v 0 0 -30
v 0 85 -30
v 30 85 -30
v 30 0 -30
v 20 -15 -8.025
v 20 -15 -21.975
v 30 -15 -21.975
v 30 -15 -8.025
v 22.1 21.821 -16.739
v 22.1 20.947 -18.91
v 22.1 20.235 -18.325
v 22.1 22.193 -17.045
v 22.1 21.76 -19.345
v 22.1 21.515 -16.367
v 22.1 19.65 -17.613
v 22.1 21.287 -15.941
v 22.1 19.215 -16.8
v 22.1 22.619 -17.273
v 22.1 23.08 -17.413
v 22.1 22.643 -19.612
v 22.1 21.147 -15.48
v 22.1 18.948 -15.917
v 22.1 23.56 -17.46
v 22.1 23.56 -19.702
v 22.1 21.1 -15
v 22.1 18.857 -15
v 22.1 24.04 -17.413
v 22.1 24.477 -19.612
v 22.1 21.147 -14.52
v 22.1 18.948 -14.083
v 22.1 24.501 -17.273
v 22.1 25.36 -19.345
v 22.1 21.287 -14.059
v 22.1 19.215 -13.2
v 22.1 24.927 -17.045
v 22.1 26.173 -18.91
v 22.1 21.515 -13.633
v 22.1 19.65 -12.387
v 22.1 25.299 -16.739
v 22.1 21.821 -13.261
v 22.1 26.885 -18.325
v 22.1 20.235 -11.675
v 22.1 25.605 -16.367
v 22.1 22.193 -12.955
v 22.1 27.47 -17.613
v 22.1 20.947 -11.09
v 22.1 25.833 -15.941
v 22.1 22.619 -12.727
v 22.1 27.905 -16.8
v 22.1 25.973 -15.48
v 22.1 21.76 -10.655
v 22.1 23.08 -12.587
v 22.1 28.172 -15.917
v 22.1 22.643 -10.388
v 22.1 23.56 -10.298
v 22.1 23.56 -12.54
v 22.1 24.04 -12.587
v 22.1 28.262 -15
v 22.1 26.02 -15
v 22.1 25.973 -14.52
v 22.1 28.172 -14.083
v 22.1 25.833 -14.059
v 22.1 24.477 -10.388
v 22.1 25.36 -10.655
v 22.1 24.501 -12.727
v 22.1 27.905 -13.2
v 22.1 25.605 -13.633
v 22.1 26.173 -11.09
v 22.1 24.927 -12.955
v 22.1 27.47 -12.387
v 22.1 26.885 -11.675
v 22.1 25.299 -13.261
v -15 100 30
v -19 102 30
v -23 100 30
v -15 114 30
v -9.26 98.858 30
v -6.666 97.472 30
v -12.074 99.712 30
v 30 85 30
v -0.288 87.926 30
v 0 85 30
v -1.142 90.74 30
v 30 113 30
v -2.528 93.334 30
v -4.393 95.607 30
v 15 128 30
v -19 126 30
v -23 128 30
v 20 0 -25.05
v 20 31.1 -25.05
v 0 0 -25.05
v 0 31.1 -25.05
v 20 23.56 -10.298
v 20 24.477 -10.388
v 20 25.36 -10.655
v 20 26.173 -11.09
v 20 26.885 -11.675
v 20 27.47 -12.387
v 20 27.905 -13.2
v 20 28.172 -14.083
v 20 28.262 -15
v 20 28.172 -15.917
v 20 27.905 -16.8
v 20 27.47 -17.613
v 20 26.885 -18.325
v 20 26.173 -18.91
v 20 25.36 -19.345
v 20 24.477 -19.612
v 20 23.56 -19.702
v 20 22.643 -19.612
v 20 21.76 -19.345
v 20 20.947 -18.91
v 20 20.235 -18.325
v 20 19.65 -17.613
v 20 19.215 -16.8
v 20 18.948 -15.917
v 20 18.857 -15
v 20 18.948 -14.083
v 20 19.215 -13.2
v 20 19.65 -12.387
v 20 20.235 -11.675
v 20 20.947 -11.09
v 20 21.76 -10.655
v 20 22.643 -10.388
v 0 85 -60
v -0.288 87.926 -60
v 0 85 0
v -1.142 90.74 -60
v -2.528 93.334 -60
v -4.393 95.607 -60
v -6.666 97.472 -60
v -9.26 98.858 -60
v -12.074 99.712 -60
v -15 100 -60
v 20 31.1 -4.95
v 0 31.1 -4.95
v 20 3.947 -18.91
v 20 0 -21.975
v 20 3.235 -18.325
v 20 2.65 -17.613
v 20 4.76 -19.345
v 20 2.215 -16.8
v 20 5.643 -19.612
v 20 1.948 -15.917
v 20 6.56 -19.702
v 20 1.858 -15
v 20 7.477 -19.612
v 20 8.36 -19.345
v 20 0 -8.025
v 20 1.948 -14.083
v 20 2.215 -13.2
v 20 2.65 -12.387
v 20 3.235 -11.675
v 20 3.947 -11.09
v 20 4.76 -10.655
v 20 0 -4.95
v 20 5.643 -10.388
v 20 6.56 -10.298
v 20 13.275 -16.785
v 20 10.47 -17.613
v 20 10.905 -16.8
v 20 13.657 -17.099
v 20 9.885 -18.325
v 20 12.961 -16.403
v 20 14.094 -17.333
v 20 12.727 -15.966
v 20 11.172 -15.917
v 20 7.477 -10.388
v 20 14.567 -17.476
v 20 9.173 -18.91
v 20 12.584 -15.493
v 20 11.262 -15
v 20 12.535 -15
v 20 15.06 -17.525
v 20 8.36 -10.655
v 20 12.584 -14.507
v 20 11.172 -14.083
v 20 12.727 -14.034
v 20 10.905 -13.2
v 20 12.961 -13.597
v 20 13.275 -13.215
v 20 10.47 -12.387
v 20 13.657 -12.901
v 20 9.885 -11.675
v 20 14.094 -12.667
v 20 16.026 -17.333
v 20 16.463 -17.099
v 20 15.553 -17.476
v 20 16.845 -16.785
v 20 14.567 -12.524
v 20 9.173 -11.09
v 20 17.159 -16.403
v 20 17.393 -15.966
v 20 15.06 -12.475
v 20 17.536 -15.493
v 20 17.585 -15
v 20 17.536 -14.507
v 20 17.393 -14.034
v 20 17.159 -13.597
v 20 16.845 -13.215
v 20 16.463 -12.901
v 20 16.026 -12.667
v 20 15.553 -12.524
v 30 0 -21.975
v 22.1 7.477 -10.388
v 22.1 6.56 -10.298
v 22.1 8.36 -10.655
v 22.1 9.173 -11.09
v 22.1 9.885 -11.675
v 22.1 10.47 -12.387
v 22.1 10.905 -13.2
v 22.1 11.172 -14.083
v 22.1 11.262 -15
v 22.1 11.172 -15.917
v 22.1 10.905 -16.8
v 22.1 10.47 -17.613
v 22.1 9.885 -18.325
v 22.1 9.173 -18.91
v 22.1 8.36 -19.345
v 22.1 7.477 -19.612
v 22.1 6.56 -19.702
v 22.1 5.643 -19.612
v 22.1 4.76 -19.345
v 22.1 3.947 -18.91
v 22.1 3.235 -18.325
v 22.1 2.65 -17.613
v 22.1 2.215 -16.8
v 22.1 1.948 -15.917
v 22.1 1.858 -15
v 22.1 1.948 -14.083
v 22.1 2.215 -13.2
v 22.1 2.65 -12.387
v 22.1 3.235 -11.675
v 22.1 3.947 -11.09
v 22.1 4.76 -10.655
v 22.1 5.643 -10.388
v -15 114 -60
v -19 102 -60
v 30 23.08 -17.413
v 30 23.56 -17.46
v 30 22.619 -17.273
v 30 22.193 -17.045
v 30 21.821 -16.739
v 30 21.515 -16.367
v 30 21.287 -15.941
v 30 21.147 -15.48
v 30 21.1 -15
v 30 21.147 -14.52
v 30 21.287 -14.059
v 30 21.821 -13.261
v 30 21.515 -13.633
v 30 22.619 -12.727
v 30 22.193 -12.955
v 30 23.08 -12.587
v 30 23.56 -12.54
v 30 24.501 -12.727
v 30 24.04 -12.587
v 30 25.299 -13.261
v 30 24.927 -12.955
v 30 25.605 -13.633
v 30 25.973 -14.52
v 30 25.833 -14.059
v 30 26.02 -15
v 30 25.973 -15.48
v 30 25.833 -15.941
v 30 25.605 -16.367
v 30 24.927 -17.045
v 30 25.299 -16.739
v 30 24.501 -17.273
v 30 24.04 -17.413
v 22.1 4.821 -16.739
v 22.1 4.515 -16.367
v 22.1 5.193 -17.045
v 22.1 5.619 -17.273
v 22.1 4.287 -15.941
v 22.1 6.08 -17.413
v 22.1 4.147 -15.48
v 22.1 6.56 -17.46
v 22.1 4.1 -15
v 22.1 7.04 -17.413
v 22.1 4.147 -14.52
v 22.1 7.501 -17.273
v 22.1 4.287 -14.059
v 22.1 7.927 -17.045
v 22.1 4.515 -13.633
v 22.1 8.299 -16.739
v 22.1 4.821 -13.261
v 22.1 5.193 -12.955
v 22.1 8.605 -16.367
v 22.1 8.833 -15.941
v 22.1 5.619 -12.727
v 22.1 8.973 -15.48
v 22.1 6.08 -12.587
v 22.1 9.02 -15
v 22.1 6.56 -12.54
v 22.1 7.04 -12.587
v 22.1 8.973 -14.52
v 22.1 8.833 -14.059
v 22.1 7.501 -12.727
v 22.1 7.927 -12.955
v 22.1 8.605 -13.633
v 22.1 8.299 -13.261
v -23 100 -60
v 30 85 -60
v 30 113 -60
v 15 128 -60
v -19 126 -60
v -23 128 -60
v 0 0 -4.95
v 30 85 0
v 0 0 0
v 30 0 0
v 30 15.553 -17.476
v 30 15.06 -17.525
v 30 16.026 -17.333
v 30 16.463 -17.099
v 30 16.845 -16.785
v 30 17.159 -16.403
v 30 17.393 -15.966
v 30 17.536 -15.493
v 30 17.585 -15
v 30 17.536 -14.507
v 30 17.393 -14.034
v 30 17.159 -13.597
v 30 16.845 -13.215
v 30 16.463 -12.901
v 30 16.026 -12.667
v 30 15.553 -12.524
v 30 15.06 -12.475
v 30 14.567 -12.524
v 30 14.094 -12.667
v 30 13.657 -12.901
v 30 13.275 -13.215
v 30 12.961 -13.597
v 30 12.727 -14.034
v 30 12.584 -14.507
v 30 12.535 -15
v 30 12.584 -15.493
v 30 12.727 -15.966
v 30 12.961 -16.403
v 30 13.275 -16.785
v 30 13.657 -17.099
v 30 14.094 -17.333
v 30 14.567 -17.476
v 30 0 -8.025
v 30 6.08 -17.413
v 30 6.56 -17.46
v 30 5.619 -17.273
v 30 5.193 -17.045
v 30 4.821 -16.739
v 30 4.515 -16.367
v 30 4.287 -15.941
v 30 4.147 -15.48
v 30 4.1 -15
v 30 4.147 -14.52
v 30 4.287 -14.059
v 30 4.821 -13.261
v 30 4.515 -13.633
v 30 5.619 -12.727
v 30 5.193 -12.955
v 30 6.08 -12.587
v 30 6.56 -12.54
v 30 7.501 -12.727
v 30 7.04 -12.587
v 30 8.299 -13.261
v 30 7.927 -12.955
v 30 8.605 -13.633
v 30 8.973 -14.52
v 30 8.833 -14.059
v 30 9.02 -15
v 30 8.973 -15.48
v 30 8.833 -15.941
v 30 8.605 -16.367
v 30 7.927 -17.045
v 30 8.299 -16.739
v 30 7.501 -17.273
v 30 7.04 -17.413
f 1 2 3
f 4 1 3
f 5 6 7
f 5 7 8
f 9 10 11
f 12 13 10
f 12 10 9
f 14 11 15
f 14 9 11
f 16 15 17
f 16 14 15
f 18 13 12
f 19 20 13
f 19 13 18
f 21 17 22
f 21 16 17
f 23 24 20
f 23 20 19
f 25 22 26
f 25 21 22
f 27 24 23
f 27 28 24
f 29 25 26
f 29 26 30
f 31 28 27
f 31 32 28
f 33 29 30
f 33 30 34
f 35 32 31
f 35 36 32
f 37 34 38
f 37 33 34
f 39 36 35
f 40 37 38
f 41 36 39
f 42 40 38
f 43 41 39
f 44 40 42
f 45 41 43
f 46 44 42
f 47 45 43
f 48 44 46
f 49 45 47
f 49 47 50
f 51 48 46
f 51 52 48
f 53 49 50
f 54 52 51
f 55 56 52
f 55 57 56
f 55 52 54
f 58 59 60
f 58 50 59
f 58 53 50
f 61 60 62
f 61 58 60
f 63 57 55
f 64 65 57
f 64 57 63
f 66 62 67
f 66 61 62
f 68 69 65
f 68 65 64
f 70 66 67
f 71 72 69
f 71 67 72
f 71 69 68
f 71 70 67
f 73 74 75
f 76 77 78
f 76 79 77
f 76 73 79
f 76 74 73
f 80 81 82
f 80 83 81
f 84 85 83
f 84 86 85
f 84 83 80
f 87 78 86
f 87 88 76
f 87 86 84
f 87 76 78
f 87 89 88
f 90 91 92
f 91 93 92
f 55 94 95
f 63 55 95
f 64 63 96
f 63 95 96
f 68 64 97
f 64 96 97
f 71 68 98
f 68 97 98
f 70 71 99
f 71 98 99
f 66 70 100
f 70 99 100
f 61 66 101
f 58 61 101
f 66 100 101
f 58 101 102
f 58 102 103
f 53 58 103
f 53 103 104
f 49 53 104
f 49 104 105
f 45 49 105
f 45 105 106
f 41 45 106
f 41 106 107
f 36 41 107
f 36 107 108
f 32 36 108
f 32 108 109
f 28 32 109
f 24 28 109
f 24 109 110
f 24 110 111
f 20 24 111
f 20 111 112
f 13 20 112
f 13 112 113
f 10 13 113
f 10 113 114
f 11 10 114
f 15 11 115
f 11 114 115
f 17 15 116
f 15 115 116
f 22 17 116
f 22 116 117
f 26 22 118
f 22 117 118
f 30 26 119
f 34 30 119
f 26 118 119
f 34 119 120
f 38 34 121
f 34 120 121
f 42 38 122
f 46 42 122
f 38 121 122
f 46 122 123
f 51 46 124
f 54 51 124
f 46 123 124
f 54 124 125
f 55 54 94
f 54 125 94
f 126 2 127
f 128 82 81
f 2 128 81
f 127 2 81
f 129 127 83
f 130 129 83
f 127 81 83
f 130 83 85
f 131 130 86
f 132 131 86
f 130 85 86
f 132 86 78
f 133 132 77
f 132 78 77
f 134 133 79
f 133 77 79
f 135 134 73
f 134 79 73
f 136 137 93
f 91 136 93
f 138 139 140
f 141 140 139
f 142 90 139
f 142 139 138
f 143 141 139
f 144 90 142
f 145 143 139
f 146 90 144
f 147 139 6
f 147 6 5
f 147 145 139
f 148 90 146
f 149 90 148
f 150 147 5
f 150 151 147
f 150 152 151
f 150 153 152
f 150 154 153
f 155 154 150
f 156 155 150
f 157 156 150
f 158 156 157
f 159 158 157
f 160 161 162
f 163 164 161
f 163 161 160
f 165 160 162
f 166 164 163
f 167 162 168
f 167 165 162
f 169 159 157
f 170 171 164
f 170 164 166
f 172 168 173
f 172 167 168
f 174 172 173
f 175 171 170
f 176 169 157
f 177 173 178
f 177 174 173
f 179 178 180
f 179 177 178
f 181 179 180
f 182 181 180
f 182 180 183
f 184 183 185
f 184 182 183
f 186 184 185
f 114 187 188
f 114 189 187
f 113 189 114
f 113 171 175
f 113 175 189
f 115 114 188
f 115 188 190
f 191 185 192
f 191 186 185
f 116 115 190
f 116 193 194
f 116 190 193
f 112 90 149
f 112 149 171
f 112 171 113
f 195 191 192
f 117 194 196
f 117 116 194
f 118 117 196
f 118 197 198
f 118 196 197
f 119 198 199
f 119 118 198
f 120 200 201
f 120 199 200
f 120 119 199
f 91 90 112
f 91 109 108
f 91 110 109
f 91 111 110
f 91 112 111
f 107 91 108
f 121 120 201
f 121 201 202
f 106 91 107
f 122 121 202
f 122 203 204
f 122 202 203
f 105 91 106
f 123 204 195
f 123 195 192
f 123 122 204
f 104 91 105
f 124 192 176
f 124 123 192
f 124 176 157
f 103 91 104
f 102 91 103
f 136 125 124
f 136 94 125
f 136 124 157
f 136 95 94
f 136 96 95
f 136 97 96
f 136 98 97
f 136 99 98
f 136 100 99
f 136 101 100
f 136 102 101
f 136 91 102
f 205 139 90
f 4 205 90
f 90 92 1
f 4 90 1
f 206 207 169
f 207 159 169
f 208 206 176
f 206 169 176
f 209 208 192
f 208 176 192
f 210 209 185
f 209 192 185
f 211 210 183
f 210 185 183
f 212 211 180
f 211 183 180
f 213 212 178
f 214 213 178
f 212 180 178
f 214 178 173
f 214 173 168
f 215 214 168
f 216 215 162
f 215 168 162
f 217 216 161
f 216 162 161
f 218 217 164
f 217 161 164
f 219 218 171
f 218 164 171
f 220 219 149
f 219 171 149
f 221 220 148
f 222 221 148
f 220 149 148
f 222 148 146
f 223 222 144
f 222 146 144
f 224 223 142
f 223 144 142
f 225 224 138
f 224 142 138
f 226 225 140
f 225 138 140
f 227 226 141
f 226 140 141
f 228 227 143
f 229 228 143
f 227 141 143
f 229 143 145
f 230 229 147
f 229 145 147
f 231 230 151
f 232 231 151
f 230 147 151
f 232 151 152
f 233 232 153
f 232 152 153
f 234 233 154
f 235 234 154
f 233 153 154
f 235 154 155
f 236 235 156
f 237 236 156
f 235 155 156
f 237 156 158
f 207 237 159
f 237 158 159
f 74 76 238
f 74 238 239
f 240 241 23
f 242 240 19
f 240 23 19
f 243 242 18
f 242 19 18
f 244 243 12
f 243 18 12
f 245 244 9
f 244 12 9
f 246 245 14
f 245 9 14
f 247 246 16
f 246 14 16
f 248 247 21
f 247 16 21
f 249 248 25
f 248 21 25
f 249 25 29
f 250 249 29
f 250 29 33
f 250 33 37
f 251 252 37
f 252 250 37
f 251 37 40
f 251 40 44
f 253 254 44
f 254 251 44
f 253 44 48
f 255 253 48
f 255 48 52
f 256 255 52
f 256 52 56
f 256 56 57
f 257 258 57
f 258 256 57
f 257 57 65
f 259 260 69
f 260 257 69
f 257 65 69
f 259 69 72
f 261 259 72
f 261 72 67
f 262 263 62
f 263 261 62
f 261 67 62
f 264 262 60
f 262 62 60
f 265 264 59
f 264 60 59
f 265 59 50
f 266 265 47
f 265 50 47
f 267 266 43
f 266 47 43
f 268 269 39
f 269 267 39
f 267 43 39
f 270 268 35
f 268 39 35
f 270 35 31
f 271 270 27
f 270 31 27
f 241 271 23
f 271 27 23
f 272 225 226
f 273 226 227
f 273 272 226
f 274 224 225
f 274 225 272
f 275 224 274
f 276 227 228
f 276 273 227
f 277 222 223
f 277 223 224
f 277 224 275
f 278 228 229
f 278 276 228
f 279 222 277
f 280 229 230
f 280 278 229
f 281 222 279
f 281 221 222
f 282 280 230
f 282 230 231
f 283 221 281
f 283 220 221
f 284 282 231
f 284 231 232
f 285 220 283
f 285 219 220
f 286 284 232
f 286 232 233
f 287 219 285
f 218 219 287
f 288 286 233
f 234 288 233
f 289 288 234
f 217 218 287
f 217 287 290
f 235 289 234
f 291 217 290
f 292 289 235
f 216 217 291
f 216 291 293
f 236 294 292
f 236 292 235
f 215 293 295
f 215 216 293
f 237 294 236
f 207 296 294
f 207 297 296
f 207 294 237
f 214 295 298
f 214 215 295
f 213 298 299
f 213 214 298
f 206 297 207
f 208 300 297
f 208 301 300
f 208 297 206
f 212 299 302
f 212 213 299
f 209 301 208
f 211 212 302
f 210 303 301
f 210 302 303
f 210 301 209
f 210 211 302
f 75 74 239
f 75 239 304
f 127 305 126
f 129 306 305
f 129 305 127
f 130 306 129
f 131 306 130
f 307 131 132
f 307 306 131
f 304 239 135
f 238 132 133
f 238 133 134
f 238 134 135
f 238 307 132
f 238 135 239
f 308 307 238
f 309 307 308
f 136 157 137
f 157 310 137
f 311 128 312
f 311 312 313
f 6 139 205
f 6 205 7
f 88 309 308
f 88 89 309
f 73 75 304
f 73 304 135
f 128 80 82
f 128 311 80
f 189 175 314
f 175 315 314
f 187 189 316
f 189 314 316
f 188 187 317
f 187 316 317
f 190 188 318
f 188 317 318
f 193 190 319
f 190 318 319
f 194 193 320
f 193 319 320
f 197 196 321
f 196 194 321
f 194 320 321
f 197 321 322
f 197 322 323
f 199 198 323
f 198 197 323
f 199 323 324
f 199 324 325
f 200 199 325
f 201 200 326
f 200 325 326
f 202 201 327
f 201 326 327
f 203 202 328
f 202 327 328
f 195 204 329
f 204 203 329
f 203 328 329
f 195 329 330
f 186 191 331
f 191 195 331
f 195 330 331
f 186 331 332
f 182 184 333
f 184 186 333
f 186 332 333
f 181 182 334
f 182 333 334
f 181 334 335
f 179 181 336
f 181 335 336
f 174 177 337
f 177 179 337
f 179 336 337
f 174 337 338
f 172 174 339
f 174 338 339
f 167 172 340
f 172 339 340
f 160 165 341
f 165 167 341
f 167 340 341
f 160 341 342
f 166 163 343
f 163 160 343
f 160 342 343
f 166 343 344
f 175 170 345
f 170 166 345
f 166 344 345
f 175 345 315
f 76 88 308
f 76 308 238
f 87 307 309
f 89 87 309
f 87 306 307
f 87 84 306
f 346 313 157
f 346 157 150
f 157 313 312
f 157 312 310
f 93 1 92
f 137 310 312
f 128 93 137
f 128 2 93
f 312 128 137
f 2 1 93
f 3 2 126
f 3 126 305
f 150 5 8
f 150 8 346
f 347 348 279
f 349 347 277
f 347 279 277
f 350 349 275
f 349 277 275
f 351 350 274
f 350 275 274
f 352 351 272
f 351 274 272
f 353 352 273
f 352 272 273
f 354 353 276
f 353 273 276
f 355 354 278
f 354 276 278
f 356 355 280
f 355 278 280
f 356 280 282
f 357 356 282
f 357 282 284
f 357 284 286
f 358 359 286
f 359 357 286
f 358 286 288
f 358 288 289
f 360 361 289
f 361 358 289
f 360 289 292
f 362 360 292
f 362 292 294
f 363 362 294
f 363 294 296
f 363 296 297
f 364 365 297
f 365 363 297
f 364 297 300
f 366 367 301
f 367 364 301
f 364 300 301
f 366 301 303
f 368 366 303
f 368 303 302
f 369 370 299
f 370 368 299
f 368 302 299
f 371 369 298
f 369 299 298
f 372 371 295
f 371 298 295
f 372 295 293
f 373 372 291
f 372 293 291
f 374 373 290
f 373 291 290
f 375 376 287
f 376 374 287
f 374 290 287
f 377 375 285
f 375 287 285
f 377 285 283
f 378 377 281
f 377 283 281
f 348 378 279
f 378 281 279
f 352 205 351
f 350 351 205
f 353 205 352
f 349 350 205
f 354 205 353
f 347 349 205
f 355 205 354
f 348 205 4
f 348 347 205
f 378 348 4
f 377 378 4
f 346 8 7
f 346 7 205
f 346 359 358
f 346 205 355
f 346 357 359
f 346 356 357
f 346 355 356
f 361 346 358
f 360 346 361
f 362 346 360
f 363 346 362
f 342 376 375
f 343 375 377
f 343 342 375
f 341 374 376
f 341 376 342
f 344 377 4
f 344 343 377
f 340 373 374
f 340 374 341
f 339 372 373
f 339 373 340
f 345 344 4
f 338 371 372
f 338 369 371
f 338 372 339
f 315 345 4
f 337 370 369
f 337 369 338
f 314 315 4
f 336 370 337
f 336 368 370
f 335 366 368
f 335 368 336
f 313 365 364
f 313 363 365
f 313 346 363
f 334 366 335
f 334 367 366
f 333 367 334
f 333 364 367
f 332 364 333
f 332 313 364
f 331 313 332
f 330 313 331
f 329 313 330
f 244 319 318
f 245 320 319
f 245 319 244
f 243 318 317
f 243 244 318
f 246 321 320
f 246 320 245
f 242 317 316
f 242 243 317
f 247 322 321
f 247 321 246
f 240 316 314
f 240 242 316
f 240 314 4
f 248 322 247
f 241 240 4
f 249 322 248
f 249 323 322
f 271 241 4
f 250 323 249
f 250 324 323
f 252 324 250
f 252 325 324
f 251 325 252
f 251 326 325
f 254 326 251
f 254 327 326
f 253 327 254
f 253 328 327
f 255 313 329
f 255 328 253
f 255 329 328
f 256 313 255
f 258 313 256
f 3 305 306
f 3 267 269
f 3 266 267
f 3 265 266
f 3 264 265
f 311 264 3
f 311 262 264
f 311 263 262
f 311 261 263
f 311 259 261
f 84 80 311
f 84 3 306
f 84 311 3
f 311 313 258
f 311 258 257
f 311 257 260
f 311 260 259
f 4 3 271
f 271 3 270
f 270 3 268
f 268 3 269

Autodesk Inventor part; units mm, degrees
ref_plane "YZ Plane" through (0, 0, 0) normal (1, 0, 0) x (0, 1, 0)
ref_plane "XZ Plane" through (0, 0, 0) normal (0, 1, 0) x (-1, 0, 0)
sketch "Sketch1" plane through (0, 0, 0) normal (0, 0, 1) x (1, 0, 0)
  line L0 (0, 0) -> (25, 0)
  line L1 (25, 0) -> (25, 40)
  line L2 (25, 40) -> (0, 40)
  line L3 (0, 40) -> (0, 0)
  dimension "d1" = 25
  dimension "d2" = 40
  dimension "d3" = 25
extrude "Extrusion1" add sketch "Sketch1" against normal blind 30
sketch "Sketch2" plane through (25, 0, 0) normal (1, 0, 0) x (0, 0, -1)
  line L0 (0, 0) -> (30, 0) projected
  circle A0 centre (15, 6.56) radius 2.46
extrude "Extrusion2" cut sketch "Sketch2" against normal blind 30
sketch "Sketch3" plane through (0, 0, 0) normal (-1, 0, 0) x (0, 0, 1)
  line L0 (0, 0) -> (-30, 0) projected
  line L1 (-25.05, 0) -> (-4.95, 0)
  line L2 (-4.95, 0) -> (-4.95, 33.12)
  line L3 (-4.95, 33.12) -> (-25.05, 33.12)
  line L4 (-25.05, 33.12) -> (-25.05, 0)
  dimension "d11" = 20.1
extrude "Extrusion3" cut sketch "Sketch3" against normal blind 20
sketch "Sketch4" plane through (0, 0, 0) normal (0, -1, 0) x (1, 0, 0)
  line L0 (20, -4.95) -> (20, -25.05) projected
  line L1 (20, -15) -> (25, -15)
  line L2 (25, 0) -> (25, -30) projected
  line L3 (20, -8.025) -> (25, -8.025)
  line L4 (25, -8.025) -> (25, -21.975)
  line L5 (25, -21.975) -> (20, -21.975)
  line L6 (20, -21.975) -> (20, -8.025)
  line L7 (20, -8.025) -> (25, -21.975) construction
  line L8 (25, -8.025) -> (20, -21.975) construction
  line L9 (25, -12.54) -> (25, -17.46) projected
  point P0 (0, 0)
  point P1 (22.5, -15)
  dimension "d14" = 13.95
extrude "Extrusion4" add sketch "Sketch4" along normal blind 15
sketch "Sketch5" plane through (20, 0, 0) normal (-1, 0, 0) x (0, 0, 1)
  circle A0 centre (-15, 6.56) radius 2.46 projected
  circle A1 centre (-15, 6.56) radius 4.7025
  circle A2 centre (-15, 6.56) radius 2.46 projected
  circle A3 centre (-15, 6.56) radius 2.46
  point P0 (0, 0)
  dimension "d17" = 9.405
extrude "Extrusion5" cut sketch "Sketch5" against normal blind 2.1
sketch "Sketch6" plane through (25, 0, 0) normal (1, 0, 0) x (0, 0, -1)
  circle A0 centre (15, 6.56) radius 4.7025 projected
  line L0 (15, 6.56) -> (15, 23.56)
  circle A1 centre (15, 23.56) radius 2.46
  point P0 (0, 0)
  dimension "d20" = 17
  dimension "d21" = 4.92
extrude "Extrusion6" cut sketch "Sketch6" against normal blind 10 contours A1
sketch "Sketch7" plane through (20, 0, 0) normal (-1, 0, 0) x (0, 0, 1)
  circle A0 centre (-15, 23.56) radius 2.46 projected
  circle A1 centre (-15, 23.56) radius 4.7025
  point P0 (0, 0)
  dimension "d24" = 9.405
extrude "Extrusion7" cut sketch "Sketch7" against normal blind 2.1
sketch "Sketch9" plane through (25, 0, 0) normal (1, 0, 0) x (0, 0, -1)
  circle A0 centre (15, 6.56) radius 2.46 projected
  circle A1 centre (15, 6.56) radius 2.46
  circle A2 centre (15, 23.56) radius 2.46 projected
  circle A3 centre (15, 23.56) radius 2.46
  line L0 (30, 40) -> (30, 0) projected
  line L1 (30, 0) -> (30, 40)
  line L2 (30, 40) -> (0, 40)
  line L3 (0, 40) -> (0, 0)
  line L4 (0, 0) -> (8.025, 0) projected
  line L5 (21.975, 0) -> (21.975, -15)
  line L6 (21.975, -15) -> (8.025, -15)
  line L7 (8.025, -15) -> (8.025, 0)
  line L8 (0, 0) -> (8.025, 0)
  line L9 (21.975, 0) -> (30, 0)
extrude "Extrusion8" add sketch "Sketch9" along normal blind 5
sketch "Sketch10" plane through (0, 40, 0) normal (0, 1, 0) x (1, 0, 0)
  line L0 (0, 30) -> (30, 30) projected
  line L1 (30, 0) -> (0, 0) projected
  line L2 (0, 30) -> (30, 30)
  line L3 (30, 30) -> (30, 0)
  line L4 (30, 0) -> (0, 0)
  line L5 (0, 0) -> (0, 30)
extrude "Extrusion9" add sketch "Sketch10" along normal blind 30
sketch "Sketch12" plane through (30, 0, 0) normal (1, 0, 0) x (0, 0, -1)
  circle A0 centre (15, 6.56) radius 2.46 projected
  line L0 (15, 6.56) -> (15, 15.06)
  circle A1 centre (15, 15.06) radius 2.525
  point P0 (0, 0)
  dimension "d31" = 8.5
  dimension "d33" = 5.05
extrude "Extrusion10" cut sketch "Sketch12" against normal blind 30 contours A1
sketch "Sketch14" plane through (0, 0, 0) normal (0, 0, 1) x (1, 0, 0)
  line L0 (30, 70) -> (0, 70) projected
  line L1 (0, 70) -> (0, 85)
  line L2 (-15, 100) -> (-23, 100)
  line L3 (30, 0) -> (30, 70) projected
  line L4 (30, 113) -> (30, 70)
  arc A0 (0, 85) -> (-15, 100) centre (-15, 85) ccw
  line L5 (30, 105) -> (30, 100)
  line L6 (-23, 128) -> (15, 128)
  line L7 (-19, 126) -> (-23, 128)
  line L8 (-19, 126) -> (-15, 114)
  line L9 (-19, 102) -> (-23, 100)
  line L10 (-19, 102) -> (-15, 114)
  line L11 (30, 113) -> (15, 128)
  point P0 (0, 0)
  point P1 (0, 100)
  dimension "d47" = 30
  dimension "d54" = 15
  dimension "d69" = 28
extrude "Extrusion12" add sketch "Sketch14" against normal blind 30
sketch "Sketch15" plane through (0, 0, -25.05) normal (-1, 0, 0) x (0, 0, 1)
  line L0 (0, 33.12) -> (20.1, 33.12) projected
  line L1 (20.1, 33.12) -> (20.1, 0) projected
  line L2 (0, 33.12) -> (20.1, 33.12)
  line L3 (20.1, 33.12) -> (20.1, 31.1)
  line L4 (20.1, 31.1) -> (0, 31.1)
  line L5 (0, 31.1) -> (0, 33.12)
  point P0 (25.05, 0)
  dimension "d57" = 2.02
extrude "Extrusion13" add sketch "Sketch15" against normal blind 20
sketch "Sketch20" plane through (0, 0, 0) normal (0, 0, 1) x (1, 0, 0)
  arc A0 (0, 85) -> (-15, 100) centre (-15, 85) ccw projected
  arc A1 (0, 85) -> (-15, 100) centre (-15, 85) ccw
  line L0 (-15, 100) -> (-23, 100) projected
  line L1 (-15, 100) -> (-23, 100)
  line L2 (-23, 100) -> (-19, 102) projected
  line L3 (-23, 100) -> (-19, 102)
  line L4 (-19, 102) -> (-15, 114) projected
  line L5 (-19, 102) -> (-15, 114)
  line L6 (-15, 114) -> (-19, 126) projected
  line L7 (-15, 114) -> (-19, 126)
  line L8 (-19, 126) -> (-23, 128) projected
  line L9 (-19, 126) -> (-23, 128)
  line L10 (-23, 128) -> (15, 128) projected
  line L11 (-23, 128) -> (15, 128)
  line L12 (15, 128) -> (30, 113) projected
  line L13 (15, 128) -> (30, 113)
  line L14 (30, 113) -> (30, 85)
  line L15 (30, 0) -> (30, 113) projected
  line L16 (30, 85) -> (0, 85)
  point P0 (0, 0)
extrude "Extrusion14" add sketch "Sketch20" along normal blind 30
ref_plane "Work Plane1" through (0, 0, -15) normal (0, 0, 1) x (1, 0, 0)
mirror "Mirror1" about plane through (0, 0, -15) normal (0, 0, 1) of "Extrusion14"
properties part number "24mm_x_90mm"
